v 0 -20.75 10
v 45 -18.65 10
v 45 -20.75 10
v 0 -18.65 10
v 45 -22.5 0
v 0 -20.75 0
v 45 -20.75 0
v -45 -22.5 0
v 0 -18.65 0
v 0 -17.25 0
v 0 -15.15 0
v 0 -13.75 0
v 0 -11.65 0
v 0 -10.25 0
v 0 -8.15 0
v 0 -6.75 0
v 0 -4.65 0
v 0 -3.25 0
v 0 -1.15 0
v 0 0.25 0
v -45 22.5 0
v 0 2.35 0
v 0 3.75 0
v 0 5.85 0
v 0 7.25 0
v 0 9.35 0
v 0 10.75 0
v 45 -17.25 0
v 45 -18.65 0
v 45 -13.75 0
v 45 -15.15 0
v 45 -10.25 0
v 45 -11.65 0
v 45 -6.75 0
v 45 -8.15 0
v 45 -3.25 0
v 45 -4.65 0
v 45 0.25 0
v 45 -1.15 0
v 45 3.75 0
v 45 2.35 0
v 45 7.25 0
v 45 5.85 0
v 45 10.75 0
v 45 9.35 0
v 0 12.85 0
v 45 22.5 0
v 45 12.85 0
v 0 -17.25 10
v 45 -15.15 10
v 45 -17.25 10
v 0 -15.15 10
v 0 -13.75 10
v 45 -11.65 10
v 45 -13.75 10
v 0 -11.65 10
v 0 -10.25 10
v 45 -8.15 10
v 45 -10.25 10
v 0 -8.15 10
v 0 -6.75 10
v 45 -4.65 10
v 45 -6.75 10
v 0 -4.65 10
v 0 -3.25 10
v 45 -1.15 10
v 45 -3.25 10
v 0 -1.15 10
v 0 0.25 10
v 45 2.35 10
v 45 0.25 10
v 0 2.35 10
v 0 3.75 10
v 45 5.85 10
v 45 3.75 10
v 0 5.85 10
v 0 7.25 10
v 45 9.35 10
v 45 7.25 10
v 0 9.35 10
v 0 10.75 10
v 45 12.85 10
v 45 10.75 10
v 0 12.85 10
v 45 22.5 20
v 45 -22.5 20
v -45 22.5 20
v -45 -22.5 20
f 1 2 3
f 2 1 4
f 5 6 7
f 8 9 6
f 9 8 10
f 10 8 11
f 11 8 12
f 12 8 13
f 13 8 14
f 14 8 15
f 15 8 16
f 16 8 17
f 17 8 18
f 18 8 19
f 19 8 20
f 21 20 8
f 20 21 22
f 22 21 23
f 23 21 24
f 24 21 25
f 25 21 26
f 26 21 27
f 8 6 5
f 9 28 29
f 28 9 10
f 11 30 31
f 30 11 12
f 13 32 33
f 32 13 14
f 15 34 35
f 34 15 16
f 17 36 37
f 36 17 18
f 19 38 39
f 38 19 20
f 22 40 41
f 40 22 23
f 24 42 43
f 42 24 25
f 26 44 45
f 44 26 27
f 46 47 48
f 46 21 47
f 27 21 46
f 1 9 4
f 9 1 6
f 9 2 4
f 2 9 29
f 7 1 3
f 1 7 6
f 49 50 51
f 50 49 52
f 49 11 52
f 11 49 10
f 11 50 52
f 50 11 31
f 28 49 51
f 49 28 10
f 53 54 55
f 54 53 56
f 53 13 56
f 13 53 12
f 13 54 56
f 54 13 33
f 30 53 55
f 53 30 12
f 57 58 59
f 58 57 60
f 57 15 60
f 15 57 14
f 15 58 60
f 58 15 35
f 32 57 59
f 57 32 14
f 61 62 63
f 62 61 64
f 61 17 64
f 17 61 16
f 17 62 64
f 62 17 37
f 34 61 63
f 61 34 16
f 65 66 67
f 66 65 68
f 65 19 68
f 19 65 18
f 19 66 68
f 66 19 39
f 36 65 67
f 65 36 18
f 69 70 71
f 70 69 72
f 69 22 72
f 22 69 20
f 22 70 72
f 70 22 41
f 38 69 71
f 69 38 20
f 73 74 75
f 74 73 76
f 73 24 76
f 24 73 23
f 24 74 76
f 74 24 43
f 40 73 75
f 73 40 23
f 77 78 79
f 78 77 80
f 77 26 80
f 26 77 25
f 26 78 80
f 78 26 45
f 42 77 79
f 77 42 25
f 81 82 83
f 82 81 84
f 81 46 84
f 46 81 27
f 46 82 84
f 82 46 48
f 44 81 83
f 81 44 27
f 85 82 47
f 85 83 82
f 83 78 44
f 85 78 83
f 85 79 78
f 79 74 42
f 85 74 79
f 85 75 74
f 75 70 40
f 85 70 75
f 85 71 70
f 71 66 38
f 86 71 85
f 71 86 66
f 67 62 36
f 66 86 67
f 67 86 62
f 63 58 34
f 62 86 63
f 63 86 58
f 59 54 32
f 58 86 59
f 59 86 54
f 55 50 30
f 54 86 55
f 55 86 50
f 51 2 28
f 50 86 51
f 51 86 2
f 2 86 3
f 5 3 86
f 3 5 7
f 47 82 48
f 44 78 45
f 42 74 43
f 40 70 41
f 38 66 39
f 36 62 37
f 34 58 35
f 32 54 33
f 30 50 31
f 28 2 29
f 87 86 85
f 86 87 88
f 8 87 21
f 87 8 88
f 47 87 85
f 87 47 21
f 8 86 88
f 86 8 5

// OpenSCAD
// Drying rack for microscope slides - a solid base block with a row of parallel slots cut into
// the top face, so slides stand upright on their long edge. NOVEL general part (a generic
// "slide rack").
//

slides   = 10;
slide_w  = 75;
slide_h  = 25;
slide_t  = 1;
base_l   = 90;
base_w   = 45;
base_h   = 20;
slot_l   = 77;
slot_w   = 1.6;
slot_d   = 10;
pitch    = 3.5;

$fn = 48;

slot_w_eff = slot_w + 0.5;                 // open the cut so it doesn't bridge at wall quality

difference() {
    translate([-base_l / 2, -base_w / 2, 0]) cube([base_l, base_w, base_h]);
    for (i = [0 : slides - 1])
        translate([0, -base_w / 2 + pitch / 2 + i * pitch, 0])
            cube([slot_l, slot_w_eff, slot_d]);
}
